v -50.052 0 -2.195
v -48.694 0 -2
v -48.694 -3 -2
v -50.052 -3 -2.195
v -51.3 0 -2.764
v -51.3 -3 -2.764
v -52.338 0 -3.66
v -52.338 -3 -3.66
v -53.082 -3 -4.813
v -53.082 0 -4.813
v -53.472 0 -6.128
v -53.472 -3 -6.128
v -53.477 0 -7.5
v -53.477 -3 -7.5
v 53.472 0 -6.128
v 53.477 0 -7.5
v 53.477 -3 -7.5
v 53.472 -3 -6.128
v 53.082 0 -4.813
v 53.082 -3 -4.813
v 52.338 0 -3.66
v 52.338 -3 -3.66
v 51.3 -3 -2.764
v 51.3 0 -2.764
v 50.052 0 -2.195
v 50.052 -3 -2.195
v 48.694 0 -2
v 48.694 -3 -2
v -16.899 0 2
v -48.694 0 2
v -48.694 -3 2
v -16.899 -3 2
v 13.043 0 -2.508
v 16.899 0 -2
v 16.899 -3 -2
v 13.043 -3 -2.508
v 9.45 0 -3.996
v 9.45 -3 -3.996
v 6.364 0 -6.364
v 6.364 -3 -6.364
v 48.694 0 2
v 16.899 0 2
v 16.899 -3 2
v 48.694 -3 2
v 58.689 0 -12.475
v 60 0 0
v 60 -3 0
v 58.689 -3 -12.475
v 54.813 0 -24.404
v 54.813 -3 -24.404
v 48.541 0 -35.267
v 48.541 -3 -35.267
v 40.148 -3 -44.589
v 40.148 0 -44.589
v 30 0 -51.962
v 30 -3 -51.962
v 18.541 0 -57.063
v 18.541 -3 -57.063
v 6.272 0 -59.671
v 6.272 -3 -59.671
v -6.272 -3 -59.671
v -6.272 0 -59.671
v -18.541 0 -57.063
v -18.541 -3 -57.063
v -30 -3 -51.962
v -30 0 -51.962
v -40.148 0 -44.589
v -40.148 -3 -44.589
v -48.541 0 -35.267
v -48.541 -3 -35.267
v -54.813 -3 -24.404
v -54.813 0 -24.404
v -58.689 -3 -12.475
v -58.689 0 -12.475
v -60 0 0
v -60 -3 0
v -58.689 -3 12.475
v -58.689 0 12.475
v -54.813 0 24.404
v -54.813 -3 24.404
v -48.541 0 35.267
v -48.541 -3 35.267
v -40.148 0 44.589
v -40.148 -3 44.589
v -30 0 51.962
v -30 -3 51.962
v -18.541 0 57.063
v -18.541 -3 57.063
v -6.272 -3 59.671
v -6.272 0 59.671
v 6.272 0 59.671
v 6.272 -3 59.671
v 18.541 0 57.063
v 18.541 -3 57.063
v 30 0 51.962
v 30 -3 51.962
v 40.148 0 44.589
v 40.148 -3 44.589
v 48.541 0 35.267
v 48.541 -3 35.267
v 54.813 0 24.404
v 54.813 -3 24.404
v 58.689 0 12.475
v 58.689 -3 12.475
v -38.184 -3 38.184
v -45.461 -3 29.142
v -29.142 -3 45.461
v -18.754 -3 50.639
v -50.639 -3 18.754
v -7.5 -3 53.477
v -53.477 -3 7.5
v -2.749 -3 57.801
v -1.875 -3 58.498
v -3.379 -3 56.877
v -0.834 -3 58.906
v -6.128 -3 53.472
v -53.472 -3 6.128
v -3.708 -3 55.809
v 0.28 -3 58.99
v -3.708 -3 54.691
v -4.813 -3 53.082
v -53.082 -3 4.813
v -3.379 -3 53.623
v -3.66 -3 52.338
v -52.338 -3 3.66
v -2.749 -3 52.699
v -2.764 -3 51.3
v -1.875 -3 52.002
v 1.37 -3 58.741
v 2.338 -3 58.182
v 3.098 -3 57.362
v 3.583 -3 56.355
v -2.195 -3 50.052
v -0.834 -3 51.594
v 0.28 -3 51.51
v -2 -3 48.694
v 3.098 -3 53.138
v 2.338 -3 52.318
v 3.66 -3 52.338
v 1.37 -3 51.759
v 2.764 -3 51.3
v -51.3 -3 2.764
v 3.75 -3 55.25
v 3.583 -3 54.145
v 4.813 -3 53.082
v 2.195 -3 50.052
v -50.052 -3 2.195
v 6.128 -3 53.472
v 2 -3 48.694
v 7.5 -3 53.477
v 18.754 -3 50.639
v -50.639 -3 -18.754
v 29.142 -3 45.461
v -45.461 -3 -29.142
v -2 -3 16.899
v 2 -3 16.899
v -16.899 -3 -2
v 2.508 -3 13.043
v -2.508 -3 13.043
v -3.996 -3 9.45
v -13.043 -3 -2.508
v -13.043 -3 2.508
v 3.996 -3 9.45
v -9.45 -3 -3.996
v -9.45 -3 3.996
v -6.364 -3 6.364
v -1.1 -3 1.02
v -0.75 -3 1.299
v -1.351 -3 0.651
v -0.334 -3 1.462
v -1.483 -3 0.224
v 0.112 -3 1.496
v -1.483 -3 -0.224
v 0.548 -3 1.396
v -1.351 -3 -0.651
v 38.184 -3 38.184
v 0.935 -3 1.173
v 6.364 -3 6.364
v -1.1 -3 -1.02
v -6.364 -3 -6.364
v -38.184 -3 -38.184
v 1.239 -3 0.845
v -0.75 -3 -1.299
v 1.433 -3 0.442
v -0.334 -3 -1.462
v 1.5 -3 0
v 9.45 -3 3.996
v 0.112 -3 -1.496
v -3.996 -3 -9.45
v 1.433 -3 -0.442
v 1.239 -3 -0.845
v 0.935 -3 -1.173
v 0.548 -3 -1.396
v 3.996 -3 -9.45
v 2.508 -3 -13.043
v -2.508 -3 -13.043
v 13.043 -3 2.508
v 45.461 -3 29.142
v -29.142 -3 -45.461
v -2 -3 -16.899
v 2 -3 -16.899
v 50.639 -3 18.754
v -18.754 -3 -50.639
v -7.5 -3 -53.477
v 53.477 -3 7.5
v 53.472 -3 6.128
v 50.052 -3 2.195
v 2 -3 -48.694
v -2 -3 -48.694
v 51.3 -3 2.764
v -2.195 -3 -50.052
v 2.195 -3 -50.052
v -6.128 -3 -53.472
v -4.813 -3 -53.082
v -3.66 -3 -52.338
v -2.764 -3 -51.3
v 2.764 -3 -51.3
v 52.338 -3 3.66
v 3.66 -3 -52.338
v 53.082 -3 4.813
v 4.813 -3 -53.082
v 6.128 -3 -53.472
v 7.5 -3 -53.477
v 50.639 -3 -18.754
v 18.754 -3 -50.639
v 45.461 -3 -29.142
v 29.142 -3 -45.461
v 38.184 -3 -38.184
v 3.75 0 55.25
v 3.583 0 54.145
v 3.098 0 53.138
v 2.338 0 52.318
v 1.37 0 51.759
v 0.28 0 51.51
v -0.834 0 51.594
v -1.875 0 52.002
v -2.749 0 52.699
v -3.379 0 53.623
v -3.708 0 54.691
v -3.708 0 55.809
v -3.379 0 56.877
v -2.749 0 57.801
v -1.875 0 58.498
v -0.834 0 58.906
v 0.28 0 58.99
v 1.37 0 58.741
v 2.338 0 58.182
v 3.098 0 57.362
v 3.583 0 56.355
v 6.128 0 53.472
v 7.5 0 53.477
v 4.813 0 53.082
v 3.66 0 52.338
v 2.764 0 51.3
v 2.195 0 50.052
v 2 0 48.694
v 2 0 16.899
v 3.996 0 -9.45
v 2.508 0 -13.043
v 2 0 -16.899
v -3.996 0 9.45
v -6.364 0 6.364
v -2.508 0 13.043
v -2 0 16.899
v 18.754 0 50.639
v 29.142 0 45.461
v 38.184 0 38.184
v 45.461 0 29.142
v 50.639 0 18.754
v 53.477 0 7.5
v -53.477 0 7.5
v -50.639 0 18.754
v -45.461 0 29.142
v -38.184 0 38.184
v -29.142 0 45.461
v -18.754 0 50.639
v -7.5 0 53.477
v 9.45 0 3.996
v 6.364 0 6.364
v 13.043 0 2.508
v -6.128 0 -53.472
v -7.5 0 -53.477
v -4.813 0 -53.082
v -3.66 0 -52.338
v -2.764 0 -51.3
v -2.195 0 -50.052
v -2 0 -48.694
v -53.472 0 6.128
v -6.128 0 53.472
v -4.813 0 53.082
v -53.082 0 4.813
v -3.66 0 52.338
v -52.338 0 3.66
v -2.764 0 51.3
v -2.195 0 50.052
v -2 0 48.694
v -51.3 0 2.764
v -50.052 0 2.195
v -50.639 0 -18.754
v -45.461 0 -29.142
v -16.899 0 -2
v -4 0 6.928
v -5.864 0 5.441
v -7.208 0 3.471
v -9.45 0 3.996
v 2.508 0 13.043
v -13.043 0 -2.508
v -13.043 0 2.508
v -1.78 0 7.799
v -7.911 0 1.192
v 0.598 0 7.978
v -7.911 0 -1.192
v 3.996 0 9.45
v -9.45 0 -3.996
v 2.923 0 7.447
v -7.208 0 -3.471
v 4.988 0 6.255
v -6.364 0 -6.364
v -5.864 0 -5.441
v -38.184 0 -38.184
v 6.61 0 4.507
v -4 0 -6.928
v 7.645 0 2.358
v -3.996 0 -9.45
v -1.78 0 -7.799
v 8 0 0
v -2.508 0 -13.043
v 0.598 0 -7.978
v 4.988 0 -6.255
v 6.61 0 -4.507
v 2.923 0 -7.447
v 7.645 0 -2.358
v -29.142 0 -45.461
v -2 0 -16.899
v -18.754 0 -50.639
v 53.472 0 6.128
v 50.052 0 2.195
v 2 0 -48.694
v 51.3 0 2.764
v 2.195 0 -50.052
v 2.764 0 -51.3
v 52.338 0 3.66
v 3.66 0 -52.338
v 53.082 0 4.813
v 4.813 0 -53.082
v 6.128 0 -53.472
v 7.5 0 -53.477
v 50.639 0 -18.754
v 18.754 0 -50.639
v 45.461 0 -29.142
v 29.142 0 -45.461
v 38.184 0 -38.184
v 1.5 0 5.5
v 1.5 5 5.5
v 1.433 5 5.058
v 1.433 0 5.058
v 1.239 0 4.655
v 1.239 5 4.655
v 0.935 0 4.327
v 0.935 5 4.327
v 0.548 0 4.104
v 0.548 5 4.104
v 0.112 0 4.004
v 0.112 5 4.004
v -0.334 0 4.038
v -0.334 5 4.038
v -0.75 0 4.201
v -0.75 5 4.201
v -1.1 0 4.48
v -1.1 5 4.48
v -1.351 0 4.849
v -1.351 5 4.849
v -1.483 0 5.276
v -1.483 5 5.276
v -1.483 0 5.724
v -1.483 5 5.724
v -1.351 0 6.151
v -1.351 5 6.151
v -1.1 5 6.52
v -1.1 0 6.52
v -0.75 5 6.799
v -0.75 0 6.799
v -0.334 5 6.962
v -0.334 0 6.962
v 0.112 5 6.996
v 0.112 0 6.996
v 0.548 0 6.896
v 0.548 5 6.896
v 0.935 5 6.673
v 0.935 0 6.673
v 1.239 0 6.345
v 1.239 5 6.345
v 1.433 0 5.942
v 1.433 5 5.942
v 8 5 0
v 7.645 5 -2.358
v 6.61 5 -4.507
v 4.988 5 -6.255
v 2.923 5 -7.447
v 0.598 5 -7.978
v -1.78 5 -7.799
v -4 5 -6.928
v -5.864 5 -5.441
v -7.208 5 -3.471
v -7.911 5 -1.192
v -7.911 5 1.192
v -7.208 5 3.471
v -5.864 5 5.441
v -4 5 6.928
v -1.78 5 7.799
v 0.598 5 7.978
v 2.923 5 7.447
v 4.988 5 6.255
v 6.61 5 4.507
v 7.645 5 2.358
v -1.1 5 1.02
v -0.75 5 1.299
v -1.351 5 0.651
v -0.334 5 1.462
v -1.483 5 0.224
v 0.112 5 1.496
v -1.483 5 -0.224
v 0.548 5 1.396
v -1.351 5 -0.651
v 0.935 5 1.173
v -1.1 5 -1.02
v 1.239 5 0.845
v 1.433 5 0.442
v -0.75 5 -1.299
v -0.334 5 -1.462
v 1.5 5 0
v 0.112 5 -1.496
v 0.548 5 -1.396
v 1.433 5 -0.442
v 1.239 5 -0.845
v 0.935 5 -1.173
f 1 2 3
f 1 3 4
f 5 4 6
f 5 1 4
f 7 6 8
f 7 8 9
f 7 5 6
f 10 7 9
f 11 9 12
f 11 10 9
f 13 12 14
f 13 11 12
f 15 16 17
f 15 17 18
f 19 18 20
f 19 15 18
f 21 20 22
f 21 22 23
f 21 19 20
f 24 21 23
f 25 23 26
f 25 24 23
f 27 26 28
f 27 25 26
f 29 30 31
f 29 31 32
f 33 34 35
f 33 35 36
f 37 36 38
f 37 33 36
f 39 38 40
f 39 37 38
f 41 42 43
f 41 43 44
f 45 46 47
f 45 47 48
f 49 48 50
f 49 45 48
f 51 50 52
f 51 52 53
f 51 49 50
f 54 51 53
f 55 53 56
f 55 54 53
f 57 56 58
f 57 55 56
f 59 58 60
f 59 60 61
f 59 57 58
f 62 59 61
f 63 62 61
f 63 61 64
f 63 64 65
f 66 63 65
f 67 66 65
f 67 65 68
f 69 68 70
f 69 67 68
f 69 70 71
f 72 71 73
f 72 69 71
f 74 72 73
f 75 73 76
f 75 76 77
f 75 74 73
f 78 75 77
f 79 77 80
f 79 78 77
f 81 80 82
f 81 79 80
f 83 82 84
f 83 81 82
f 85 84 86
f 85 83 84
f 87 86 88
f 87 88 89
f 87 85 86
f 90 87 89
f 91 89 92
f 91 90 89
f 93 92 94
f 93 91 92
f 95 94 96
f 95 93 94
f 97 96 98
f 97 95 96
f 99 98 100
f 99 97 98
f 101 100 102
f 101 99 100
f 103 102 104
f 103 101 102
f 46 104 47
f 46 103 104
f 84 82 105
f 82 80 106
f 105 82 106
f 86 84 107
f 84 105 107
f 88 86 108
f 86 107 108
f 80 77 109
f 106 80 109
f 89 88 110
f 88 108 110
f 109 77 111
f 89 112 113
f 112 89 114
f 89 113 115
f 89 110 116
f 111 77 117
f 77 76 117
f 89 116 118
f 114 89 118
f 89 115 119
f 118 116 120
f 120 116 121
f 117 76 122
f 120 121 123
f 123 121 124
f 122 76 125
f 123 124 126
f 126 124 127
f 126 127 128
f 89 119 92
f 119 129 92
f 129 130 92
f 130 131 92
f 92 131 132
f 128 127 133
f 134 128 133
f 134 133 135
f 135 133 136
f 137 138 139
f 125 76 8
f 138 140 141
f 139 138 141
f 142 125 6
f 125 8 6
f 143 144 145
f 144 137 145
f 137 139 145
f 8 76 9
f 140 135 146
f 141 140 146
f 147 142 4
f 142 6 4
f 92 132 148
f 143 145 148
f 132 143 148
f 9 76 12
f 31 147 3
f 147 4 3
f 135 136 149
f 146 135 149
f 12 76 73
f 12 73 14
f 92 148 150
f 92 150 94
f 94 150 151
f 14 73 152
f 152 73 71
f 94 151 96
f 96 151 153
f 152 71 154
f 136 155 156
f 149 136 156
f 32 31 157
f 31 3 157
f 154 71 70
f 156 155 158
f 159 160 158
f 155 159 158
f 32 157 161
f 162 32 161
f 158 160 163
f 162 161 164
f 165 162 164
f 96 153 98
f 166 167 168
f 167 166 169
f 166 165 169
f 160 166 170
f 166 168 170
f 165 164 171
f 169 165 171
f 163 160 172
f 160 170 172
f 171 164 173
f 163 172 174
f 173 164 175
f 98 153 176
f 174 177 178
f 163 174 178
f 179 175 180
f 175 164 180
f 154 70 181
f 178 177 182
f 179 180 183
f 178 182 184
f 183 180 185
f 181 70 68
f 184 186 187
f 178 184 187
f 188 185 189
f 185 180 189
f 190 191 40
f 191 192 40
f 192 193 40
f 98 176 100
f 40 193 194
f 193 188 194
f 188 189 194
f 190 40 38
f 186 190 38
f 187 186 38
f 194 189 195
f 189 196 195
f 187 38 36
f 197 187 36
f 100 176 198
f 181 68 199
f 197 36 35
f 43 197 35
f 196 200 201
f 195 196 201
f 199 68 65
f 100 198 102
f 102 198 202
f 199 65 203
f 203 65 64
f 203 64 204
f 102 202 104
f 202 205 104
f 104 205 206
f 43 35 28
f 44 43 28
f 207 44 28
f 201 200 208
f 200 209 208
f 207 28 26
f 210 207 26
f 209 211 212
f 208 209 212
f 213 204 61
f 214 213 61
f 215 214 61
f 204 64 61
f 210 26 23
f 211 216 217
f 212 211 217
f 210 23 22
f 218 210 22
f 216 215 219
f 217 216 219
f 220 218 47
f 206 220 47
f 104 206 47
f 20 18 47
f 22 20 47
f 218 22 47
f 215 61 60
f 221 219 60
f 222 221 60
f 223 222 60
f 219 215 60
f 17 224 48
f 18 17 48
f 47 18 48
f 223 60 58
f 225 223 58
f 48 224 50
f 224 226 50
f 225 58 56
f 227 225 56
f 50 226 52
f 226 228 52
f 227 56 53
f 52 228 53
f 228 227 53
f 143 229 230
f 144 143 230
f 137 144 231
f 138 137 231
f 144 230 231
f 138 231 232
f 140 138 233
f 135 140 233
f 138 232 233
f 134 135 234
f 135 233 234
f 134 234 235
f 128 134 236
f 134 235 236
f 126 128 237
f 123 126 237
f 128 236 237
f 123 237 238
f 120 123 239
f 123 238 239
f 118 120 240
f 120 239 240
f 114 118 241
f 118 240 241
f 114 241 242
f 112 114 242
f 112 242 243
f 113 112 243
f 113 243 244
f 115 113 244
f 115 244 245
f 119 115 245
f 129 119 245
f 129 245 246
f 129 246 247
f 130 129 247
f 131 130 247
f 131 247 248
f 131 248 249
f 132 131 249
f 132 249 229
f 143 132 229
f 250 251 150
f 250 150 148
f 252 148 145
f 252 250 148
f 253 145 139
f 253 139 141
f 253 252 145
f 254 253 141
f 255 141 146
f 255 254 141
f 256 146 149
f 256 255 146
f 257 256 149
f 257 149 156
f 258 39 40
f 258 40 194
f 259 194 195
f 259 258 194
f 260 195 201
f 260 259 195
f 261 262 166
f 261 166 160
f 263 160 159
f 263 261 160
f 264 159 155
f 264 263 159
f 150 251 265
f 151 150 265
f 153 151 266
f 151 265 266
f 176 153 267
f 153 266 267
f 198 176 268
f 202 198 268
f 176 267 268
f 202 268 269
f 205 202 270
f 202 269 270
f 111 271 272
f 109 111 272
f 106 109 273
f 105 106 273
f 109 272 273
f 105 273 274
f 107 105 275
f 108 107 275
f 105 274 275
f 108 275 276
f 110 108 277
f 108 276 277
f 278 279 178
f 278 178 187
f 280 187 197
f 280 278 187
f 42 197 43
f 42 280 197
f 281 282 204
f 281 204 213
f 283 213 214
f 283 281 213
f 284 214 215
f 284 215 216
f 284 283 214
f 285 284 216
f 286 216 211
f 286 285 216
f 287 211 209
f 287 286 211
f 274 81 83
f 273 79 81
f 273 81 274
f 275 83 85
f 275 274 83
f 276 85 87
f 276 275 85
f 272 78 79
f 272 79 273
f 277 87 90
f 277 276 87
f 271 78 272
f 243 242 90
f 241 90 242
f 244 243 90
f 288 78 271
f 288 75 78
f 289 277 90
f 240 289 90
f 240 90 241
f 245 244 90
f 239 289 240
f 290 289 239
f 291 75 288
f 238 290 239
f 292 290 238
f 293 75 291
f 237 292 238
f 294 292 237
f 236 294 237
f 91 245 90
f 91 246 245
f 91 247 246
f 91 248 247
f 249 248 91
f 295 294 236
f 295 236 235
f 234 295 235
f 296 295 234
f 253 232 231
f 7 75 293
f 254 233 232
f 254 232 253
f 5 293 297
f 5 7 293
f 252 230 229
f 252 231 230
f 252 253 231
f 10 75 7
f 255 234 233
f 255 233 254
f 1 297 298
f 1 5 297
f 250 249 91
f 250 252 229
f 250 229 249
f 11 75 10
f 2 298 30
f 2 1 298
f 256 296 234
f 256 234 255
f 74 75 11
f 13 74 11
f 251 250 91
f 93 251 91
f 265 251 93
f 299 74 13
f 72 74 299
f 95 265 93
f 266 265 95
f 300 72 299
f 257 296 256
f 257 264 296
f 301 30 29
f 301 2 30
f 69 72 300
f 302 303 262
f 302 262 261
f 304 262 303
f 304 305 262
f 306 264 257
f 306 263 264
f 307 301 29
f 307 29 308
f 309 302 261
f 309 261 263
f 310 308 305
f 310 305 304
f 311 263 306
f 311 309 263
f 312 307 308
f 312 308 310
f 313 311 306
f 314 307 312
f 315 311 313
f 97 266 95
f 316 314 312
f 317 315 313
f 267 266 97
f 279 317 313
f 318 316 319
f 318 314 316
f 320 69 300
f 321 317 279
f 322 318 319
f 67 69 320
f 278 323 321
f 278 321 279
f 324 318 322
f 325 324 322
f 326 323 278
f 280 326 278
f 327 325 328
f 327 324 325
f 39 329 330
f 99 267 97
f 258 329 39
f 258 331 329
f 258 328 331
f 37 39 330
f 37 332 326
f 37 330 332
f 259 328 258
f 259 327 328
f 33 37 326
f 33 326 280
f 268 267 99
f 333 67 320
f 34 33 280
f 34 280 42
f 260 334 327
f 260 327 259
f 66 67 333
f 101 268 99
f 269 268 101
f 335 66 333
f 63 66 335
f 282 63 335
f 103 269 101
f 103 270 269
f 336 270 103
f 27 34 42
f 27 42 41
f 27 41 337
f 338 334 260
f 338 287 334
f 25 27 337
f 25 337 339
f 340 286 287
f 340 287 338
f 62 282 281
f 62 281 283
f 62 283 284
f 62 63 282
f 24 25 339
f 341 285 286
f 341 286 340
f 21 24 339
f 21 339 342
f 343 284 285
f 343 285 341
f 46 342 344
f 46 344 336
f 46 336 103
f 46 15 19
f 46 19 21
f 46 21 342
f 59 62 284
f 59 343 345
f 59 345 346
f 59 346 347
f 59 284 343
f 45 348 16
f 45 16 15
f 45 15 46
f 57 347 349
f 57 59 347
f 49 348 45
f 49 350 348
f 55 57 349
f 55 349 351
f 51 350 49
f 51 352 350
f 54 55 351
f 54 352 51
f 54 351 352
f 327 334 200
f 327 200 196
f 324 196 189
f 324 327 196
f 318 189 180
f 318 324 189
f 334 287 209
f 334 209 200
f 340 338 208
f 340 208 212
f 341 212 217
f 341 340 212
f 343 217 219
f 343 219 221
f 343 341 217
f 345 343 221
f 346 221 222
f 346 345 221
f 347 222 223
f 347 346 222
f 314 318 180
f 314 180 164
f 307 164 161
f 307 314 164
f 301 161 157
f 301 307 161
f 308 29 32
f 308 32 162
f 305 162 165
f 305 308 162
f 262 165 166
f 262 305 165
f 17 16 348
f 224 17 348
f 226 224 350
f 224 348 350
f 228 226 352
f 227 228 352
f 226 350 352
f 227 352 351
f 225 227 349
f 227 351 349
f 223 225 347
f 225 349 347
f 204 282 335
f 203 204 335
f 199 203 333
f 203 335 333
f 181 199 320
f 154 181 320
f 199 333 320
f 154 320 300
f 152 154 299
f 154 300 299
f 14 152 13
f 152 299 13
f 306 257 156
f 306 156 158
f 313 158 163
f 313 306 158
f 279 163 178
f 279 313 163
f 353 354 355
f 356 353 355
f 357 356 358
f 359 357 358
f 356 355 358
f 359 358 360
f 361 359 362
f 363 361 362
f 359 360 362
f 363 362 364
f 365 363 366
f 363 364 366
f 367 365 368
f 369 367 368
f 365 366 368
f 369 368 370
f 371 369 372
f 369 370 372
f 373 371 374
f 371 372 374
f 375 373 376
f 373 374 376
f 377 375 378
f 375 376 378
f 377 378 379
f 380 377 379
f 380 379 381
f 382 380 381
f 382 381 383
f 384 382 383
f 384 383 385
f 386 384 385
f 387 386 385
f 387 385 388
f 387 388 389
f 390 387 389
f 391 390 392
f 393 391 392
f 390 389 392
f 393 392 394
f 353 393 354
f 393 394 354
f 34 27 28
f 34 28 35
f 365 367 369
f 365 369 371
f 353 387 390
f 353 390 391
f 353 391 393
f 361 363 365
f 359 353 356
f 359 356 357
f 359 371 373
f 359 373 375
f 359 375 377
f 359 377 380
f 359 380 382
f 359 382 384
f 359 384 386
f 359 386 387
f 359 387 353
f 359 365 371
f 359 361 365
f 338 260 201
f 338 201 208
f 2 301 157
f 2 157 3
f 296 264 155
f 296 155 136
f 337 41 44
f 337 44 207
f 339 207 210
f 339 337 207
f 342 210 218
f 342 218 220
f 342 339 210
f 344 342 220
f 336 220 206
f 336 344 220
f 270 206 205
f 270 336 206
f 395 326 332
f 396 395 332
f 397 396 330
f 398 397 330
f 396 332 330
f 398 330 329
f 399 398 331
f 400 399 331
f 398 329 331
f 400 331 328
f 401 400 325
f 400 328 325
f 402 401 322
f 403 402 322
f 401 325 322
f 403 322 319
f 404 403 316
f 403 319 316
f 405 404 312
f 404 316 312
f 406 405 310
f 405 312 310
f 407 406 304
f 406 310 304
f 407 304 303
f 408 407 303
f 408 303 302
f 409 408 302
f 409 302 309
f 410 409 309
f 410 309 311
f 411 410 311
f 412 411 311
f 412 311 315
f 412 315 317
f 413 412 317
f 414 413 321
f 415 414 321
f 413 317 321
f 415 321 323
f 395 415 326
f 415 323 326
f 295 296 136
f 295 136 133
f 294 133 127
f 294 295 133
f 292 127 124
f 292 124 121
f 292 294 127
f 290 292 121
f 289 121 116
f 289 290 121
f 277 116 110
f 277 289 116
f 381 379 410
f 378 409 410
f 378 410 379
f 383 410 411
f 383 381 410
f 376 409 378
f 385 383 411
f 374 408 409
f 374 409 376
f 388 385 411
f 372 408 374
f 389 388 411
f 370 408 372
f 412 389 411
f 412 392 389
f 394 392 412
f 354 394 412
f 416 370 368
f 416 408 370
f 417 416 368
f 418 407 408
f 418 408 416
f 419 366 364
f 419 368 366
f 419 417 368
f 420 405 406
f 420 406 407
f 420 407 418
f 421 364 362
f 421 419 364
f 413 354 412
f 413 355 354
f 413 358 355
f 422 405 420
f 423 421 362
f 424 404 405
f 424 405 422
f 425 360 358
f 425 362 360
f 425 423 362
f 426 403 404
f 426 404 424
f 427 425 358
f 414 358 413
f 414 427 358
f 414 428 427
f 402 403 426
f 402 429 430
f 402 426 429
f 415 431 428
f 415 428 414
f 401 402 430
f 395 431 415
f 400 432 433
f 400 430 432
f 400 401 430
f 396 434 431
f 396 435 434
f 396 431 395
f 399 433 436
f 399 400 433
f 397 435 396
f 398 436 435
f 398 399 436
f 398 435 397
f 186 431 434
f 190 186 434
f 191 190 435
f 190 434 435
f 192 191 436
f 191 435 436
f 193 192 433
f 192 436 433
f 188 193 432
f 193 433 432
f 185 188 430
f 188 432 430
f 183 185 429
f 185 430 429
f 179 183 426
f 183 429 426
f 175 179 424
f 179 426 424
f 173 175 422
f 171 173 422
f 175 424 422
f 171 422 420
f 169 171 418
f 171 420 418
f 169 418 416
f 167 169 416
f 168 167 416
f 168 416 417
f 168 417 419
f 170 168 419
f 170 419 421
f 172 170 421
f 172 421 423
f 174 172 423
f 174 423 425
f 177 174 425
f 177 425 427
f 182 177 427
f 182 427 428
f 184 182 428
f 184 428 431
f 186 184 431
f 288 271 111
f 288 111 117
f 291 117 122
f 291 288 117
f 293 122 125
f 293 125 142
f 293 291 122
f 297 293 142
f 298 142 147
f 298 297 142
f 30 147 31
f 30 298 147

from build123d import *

# Parameters (mm, degrees)
SKETCH1_R           = 60
SKETCH1_R_2         = 54
SKETCH1_R_3         = 8
BOSS_EXTRUDE1_DEPTH = 3
SKETCH1_3_R         = 8
BOSS_EXTRUDE2_DEPTH = 5
CUT_EXTRUDE1_REACH  = 10
SKETCH2_R           = 1.5
CUT_EXTRUDE2_REACH  = 5
SKETCH3_R           = 3.75
SKETCH4_R           = 1.5
CUT_EXTRUDE3_DEPTH  = 5


with BuildPart() as part:
    # Sketch1 → Boss-Extrude1 (new body)
    with BuildSketch(Plane(origin=(0, 0, 0), x_dir=(1, 0, 0), z_dir=(0, 1, 0))):
        Circle(SKETCH1_R)
        Circle(SKETCH1_R_2, mode=Mode.SUBTRACT)
        with BuildLine():
            ThreePointArc((7.5, -53.47663041), (3.660460389, -52.338407931), (2.000000204, -48.694167705))
            Line((2.000000204, -48.694167705), (2.000000204, -16.899494443))
            ThreePointArc((2.000000204, -16.899494443), (3.134156671, -11.197704847), (6.363961031, -6.363961031))
            ThreePointArc((6.363961031, -6.363961031), (11.197704847, -3.134156671), (16.899494443, -2.000000204))
            Line((16.899494443, -2.000000204), (48.694167705, -2.000000204))
            ThreePointArc((48.694167705, -2.000000204), (52.338407931, -3.660460389), (53.47663041, -7.5))
            ThreePointArc((53.47663041, -7.5), (53.868998701, -3.759119436), (54, 0))
            ThreePointArc((54, 0), (53.868998701, 3.759119436), (53.47663041, 7.5))
            ThreePointArc((53.47663041, 7.5), (52.338407931, 3.660460389), (48.694167705, 2.000000204))
            Line((48.694167705, 2.000000204), (16.899494443, 2.000000204))
            ThreePointArc((16.899494443, 2.000000204), (11.197704847, 3.134156671), (6.363961031, 6.363961031))
            ThreePointArc((6.363961031, 6.363961031), (3.134156671, 11.197704847), (2.000000204, 16.899494443))
            Line((2.000000204, 16.899494443), (2.000000204, 48.694167705))
            ThreePointArc((2.000000204, 48.694167705), (3.660460389, 52.338407931), (7.5, 53.47663041))
            ThreePointArc((7.5, 53.47663041), (0, 54), (-7.5, 53.47663041))
            ThreePointArc((-7.5, 53.47663041), (-3.660460389, 52.338407931), (-2.000000204, 48.694167705))
            Line((-2.000000204, 48.694167705), (-2.000000204, 16.899494443))
            ThreePointArc((-2.000000204, 16.899494443), (-3.134156671, 11.197704847), (-6.363961031, 6.363961031))
            ThreePointArc((-6.363961031, 6.363961031), (-11.197704847, 3.134156671), (-16.899494443, 2.000000204))
            Line((-16.899494443, 2.000000204), (-48.694167705, 2.000000204))
            ThreePointArc((-48.694167705, 2.000000204), (-52.338407931, 3.660460389), (-53.47663041, 7.5))
            ThreePointArc((-53.47663041, 7.5), (-54, 0), (-53.47663041, -7.5))
            ThreePointArc((-53.47663041, -7.5), (-52.338407931, -3.660460389), (-48.694167705, -2.000000204))
            Line((-48.694167705, -2.000000204), (-16.899494443, -2.000000204))
            ThreePointArc((-16.899494443, -2.000000204), (-11.197704847, -3.134156671), (-6.363961031, -6.363961031))
            ThreePointArc((-6.363961031, -6.363961031), (-3.134156671, -11.197704847), (-2.000000204, -16.899494443))
            Line((-2.000000204, -16.899494443), (-2.000000204, -48.694167705))
            ThreePointArc((-2.000000204, -48.694167705), (-3.660460389, -52.338407931), (-7.5, -53.47663041))
            ThreePointArc((-7.5, -53.47663041), (0, -54), (7.5, -53.47663041))
        make_face()
        Circle(SKETCH1_R_3, mode=Mode.SUBTRACT)
        Circle(SKETCH1_R_3)
    extrude(amount=-BOSS_EXTRUDE1_DEPTH)

    # Sketch1_3 → Boss-Extrude2 (add)
    with BuildSketch(Plane(origin=(0, 0, 0), x_dir=(1, 0, 0), z_dir=(0, 1, 0))):
        Circle(SKETCH1_3_R)
    extrude(amount=BOSS_EXTRUDE2_DEPTH)

    # Sketch2 → Cut-Extrude1 (cut, up to next)
    with BuildSketch(Plane(origin=(0, 5, 0), x_dir=(1, 0, 0), z_dir=(0, 1, 0)), mode=Mode.PRIVATE) as cut_extrude1_sk1:
        Circle(SKETCH2_R)
    cut_extrude1_tool1 = extrude(cut_extrude1_sk1.sketch, amount=-CUT_EXTRUDE1_REACH, mode=Mode.PRIVATE) & part.part
    add(cut_extrude1_tool1.solids().sort_by_distance((0, 5, 0))[0], mode=Mode.SUBTRACT)

    # Sketch3 → Cut-Extrude2 (cut, up to next)
    with BuildSketch(Plane(origin=(0, 0, 0), x_dir=(1, 0, 0), z_dir=(0, 1, 0)), mode=Mode.PRIVATE) as cut_extrude2_sk1:
        with Locations((0, -55.25)):
            Circle(SKETCH3_R)
    cut_extrude2_tool1 = extrude(cut_extrude2_sk1.sketch, amount=-CUT_EXTRUDE2_REACH, mode=Mode.PRIVATE) & part.part
    add(cut_extrude2_tool1.solids().sort_by_distance((0, 0, 55.25))[0], mode=Mode.SUBTRACT)

    # Sketch4 → Cut-Extrude3 (cut)
    with BuildSketch(Plane(origin=(0, 5, 0), x_dir=(1, 0, 0), z_dir=(0, 1, 0))):
        with Locations((0, -5.5)):
            Circle(SKETCH4_R)
    extrude(amount=-CUT_EXTRUDE3_DEPTH, mode=Mode.SUBTRACT)


solid = part.part
